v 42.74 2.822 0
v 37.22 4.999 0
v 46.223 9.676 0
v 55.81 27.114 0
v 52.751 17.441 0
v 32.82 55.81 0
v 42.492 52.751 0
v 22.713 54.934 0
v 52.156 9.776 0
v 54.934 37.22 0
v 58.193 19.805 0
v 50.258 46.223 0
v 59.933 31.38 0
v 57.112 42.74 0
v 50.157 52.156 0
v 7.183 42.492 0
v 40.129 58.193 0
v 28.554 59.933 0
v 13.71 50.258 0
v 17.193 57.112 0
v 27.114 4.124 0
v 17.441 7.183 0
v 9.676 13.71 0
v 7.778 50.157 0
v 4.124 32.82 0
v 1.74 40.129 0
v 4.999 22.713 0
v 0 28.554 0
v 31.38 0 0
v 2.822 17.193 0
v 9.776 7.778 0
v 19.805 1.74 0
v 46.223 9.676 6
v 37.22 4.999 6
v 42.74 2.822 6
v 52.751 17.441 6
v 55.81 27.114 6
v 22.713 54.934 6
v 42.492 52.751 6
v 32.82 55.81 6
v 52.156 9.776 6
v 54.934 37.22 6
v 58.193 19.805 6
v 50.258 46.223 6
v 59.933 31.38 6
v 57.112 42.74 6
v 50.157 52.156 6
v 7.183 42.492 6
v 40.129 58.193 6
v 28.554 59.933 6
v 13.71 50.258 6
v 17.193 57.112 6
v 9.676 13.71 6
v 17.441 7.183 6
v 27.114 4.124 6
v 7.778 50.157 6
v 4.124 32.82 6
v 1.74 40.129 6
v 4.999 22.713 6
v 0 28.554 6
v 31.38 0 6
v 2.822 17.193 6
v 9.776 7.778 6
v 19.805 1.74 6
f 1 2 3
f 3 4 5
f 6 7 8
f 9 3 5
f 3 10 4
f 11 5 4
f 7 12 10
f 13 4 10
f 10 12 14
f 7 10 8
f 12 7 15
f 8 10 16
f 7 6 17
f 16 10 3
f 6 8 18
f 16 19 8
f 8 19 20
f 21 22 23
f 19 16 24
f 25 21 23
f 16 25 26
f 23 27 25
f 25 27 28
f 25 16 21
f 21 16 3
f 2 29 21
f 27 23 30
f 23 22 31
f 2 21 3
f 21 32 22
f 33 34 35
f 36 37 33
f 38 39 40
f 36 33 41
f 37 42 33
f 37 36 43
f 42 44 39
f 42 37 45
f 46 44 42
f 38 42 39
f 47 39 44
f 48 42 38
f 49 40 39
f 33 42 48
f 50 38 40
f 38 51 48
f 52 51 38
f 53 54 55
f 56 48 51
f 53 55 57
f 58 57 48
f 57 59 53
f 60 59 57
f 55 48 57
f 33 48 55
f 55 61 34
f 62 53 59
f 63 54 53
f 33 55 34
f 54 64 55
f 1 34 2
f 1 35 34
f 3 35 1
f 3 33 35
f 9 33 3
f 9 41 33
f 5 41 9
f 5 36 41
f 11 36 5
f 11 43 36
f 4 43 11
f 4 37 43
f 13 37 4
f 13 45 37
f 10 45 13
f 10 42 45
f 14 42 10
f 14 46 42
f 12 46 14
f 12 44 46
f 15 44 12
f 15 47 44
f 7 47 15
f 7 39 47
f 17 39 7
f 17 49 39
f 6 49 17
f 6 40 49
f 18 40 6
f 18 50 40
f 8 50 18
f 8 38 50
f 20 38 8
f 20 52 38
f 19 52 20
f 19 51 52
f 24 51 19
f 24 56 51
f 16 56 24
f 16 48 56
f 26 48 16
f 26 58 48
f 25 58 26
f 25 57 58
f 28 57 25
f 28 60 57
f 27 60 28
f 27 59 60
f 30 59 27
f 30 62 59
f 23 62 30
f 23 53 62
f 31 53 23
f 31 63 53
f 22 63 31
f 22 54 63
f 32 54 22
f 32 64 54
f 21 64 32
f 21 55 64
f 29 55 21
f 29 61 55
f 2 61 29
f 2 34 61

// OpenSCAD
$fn = 32;

// ----------------------------------------------------------------------
// Chain sprocket: 16 teeth, 26 mm root radius
// ----------------------------------------------------------------------

// --- parameters (mm) ---
profile_height = 6;       // extrusion height
profile_points = 32;      // points of the closed outline

profile = [[55.81, 27.114], [59.933, 31.38], [54.934, 37.22], [57.112, 42.74], [50.258, 46.223], [50.157, 52.156], [42.492, 52.751], [40.129, 58.193], [32.82, 55.81], [28.554, 59.933], [22.713, 54.934], [17.193, 57.112], [13.71, 50.258], [7.778, 50.157], [7.183, 42.492], [1.74, 40.129], [4.124, 32.82], [0, 28.554], [4.999, 22.713], [2.822, 17.193], [9.676, 13.71], [9.776, 7.778], [17.441, 7.183], [19.805, 1.74], [27.114, 4.124], [31.38, 0], [37.22, 4.999], [42.74, 2.822], [46.223, 9.676], [52.156, 9.776], [52.751, 17.441], [58.193, 19.805]];  // single closed polygon, 32 points, counter clockwise

// --- the one profile operation ---
linear_extrude(height = profile_height) polygon(points = profile);
